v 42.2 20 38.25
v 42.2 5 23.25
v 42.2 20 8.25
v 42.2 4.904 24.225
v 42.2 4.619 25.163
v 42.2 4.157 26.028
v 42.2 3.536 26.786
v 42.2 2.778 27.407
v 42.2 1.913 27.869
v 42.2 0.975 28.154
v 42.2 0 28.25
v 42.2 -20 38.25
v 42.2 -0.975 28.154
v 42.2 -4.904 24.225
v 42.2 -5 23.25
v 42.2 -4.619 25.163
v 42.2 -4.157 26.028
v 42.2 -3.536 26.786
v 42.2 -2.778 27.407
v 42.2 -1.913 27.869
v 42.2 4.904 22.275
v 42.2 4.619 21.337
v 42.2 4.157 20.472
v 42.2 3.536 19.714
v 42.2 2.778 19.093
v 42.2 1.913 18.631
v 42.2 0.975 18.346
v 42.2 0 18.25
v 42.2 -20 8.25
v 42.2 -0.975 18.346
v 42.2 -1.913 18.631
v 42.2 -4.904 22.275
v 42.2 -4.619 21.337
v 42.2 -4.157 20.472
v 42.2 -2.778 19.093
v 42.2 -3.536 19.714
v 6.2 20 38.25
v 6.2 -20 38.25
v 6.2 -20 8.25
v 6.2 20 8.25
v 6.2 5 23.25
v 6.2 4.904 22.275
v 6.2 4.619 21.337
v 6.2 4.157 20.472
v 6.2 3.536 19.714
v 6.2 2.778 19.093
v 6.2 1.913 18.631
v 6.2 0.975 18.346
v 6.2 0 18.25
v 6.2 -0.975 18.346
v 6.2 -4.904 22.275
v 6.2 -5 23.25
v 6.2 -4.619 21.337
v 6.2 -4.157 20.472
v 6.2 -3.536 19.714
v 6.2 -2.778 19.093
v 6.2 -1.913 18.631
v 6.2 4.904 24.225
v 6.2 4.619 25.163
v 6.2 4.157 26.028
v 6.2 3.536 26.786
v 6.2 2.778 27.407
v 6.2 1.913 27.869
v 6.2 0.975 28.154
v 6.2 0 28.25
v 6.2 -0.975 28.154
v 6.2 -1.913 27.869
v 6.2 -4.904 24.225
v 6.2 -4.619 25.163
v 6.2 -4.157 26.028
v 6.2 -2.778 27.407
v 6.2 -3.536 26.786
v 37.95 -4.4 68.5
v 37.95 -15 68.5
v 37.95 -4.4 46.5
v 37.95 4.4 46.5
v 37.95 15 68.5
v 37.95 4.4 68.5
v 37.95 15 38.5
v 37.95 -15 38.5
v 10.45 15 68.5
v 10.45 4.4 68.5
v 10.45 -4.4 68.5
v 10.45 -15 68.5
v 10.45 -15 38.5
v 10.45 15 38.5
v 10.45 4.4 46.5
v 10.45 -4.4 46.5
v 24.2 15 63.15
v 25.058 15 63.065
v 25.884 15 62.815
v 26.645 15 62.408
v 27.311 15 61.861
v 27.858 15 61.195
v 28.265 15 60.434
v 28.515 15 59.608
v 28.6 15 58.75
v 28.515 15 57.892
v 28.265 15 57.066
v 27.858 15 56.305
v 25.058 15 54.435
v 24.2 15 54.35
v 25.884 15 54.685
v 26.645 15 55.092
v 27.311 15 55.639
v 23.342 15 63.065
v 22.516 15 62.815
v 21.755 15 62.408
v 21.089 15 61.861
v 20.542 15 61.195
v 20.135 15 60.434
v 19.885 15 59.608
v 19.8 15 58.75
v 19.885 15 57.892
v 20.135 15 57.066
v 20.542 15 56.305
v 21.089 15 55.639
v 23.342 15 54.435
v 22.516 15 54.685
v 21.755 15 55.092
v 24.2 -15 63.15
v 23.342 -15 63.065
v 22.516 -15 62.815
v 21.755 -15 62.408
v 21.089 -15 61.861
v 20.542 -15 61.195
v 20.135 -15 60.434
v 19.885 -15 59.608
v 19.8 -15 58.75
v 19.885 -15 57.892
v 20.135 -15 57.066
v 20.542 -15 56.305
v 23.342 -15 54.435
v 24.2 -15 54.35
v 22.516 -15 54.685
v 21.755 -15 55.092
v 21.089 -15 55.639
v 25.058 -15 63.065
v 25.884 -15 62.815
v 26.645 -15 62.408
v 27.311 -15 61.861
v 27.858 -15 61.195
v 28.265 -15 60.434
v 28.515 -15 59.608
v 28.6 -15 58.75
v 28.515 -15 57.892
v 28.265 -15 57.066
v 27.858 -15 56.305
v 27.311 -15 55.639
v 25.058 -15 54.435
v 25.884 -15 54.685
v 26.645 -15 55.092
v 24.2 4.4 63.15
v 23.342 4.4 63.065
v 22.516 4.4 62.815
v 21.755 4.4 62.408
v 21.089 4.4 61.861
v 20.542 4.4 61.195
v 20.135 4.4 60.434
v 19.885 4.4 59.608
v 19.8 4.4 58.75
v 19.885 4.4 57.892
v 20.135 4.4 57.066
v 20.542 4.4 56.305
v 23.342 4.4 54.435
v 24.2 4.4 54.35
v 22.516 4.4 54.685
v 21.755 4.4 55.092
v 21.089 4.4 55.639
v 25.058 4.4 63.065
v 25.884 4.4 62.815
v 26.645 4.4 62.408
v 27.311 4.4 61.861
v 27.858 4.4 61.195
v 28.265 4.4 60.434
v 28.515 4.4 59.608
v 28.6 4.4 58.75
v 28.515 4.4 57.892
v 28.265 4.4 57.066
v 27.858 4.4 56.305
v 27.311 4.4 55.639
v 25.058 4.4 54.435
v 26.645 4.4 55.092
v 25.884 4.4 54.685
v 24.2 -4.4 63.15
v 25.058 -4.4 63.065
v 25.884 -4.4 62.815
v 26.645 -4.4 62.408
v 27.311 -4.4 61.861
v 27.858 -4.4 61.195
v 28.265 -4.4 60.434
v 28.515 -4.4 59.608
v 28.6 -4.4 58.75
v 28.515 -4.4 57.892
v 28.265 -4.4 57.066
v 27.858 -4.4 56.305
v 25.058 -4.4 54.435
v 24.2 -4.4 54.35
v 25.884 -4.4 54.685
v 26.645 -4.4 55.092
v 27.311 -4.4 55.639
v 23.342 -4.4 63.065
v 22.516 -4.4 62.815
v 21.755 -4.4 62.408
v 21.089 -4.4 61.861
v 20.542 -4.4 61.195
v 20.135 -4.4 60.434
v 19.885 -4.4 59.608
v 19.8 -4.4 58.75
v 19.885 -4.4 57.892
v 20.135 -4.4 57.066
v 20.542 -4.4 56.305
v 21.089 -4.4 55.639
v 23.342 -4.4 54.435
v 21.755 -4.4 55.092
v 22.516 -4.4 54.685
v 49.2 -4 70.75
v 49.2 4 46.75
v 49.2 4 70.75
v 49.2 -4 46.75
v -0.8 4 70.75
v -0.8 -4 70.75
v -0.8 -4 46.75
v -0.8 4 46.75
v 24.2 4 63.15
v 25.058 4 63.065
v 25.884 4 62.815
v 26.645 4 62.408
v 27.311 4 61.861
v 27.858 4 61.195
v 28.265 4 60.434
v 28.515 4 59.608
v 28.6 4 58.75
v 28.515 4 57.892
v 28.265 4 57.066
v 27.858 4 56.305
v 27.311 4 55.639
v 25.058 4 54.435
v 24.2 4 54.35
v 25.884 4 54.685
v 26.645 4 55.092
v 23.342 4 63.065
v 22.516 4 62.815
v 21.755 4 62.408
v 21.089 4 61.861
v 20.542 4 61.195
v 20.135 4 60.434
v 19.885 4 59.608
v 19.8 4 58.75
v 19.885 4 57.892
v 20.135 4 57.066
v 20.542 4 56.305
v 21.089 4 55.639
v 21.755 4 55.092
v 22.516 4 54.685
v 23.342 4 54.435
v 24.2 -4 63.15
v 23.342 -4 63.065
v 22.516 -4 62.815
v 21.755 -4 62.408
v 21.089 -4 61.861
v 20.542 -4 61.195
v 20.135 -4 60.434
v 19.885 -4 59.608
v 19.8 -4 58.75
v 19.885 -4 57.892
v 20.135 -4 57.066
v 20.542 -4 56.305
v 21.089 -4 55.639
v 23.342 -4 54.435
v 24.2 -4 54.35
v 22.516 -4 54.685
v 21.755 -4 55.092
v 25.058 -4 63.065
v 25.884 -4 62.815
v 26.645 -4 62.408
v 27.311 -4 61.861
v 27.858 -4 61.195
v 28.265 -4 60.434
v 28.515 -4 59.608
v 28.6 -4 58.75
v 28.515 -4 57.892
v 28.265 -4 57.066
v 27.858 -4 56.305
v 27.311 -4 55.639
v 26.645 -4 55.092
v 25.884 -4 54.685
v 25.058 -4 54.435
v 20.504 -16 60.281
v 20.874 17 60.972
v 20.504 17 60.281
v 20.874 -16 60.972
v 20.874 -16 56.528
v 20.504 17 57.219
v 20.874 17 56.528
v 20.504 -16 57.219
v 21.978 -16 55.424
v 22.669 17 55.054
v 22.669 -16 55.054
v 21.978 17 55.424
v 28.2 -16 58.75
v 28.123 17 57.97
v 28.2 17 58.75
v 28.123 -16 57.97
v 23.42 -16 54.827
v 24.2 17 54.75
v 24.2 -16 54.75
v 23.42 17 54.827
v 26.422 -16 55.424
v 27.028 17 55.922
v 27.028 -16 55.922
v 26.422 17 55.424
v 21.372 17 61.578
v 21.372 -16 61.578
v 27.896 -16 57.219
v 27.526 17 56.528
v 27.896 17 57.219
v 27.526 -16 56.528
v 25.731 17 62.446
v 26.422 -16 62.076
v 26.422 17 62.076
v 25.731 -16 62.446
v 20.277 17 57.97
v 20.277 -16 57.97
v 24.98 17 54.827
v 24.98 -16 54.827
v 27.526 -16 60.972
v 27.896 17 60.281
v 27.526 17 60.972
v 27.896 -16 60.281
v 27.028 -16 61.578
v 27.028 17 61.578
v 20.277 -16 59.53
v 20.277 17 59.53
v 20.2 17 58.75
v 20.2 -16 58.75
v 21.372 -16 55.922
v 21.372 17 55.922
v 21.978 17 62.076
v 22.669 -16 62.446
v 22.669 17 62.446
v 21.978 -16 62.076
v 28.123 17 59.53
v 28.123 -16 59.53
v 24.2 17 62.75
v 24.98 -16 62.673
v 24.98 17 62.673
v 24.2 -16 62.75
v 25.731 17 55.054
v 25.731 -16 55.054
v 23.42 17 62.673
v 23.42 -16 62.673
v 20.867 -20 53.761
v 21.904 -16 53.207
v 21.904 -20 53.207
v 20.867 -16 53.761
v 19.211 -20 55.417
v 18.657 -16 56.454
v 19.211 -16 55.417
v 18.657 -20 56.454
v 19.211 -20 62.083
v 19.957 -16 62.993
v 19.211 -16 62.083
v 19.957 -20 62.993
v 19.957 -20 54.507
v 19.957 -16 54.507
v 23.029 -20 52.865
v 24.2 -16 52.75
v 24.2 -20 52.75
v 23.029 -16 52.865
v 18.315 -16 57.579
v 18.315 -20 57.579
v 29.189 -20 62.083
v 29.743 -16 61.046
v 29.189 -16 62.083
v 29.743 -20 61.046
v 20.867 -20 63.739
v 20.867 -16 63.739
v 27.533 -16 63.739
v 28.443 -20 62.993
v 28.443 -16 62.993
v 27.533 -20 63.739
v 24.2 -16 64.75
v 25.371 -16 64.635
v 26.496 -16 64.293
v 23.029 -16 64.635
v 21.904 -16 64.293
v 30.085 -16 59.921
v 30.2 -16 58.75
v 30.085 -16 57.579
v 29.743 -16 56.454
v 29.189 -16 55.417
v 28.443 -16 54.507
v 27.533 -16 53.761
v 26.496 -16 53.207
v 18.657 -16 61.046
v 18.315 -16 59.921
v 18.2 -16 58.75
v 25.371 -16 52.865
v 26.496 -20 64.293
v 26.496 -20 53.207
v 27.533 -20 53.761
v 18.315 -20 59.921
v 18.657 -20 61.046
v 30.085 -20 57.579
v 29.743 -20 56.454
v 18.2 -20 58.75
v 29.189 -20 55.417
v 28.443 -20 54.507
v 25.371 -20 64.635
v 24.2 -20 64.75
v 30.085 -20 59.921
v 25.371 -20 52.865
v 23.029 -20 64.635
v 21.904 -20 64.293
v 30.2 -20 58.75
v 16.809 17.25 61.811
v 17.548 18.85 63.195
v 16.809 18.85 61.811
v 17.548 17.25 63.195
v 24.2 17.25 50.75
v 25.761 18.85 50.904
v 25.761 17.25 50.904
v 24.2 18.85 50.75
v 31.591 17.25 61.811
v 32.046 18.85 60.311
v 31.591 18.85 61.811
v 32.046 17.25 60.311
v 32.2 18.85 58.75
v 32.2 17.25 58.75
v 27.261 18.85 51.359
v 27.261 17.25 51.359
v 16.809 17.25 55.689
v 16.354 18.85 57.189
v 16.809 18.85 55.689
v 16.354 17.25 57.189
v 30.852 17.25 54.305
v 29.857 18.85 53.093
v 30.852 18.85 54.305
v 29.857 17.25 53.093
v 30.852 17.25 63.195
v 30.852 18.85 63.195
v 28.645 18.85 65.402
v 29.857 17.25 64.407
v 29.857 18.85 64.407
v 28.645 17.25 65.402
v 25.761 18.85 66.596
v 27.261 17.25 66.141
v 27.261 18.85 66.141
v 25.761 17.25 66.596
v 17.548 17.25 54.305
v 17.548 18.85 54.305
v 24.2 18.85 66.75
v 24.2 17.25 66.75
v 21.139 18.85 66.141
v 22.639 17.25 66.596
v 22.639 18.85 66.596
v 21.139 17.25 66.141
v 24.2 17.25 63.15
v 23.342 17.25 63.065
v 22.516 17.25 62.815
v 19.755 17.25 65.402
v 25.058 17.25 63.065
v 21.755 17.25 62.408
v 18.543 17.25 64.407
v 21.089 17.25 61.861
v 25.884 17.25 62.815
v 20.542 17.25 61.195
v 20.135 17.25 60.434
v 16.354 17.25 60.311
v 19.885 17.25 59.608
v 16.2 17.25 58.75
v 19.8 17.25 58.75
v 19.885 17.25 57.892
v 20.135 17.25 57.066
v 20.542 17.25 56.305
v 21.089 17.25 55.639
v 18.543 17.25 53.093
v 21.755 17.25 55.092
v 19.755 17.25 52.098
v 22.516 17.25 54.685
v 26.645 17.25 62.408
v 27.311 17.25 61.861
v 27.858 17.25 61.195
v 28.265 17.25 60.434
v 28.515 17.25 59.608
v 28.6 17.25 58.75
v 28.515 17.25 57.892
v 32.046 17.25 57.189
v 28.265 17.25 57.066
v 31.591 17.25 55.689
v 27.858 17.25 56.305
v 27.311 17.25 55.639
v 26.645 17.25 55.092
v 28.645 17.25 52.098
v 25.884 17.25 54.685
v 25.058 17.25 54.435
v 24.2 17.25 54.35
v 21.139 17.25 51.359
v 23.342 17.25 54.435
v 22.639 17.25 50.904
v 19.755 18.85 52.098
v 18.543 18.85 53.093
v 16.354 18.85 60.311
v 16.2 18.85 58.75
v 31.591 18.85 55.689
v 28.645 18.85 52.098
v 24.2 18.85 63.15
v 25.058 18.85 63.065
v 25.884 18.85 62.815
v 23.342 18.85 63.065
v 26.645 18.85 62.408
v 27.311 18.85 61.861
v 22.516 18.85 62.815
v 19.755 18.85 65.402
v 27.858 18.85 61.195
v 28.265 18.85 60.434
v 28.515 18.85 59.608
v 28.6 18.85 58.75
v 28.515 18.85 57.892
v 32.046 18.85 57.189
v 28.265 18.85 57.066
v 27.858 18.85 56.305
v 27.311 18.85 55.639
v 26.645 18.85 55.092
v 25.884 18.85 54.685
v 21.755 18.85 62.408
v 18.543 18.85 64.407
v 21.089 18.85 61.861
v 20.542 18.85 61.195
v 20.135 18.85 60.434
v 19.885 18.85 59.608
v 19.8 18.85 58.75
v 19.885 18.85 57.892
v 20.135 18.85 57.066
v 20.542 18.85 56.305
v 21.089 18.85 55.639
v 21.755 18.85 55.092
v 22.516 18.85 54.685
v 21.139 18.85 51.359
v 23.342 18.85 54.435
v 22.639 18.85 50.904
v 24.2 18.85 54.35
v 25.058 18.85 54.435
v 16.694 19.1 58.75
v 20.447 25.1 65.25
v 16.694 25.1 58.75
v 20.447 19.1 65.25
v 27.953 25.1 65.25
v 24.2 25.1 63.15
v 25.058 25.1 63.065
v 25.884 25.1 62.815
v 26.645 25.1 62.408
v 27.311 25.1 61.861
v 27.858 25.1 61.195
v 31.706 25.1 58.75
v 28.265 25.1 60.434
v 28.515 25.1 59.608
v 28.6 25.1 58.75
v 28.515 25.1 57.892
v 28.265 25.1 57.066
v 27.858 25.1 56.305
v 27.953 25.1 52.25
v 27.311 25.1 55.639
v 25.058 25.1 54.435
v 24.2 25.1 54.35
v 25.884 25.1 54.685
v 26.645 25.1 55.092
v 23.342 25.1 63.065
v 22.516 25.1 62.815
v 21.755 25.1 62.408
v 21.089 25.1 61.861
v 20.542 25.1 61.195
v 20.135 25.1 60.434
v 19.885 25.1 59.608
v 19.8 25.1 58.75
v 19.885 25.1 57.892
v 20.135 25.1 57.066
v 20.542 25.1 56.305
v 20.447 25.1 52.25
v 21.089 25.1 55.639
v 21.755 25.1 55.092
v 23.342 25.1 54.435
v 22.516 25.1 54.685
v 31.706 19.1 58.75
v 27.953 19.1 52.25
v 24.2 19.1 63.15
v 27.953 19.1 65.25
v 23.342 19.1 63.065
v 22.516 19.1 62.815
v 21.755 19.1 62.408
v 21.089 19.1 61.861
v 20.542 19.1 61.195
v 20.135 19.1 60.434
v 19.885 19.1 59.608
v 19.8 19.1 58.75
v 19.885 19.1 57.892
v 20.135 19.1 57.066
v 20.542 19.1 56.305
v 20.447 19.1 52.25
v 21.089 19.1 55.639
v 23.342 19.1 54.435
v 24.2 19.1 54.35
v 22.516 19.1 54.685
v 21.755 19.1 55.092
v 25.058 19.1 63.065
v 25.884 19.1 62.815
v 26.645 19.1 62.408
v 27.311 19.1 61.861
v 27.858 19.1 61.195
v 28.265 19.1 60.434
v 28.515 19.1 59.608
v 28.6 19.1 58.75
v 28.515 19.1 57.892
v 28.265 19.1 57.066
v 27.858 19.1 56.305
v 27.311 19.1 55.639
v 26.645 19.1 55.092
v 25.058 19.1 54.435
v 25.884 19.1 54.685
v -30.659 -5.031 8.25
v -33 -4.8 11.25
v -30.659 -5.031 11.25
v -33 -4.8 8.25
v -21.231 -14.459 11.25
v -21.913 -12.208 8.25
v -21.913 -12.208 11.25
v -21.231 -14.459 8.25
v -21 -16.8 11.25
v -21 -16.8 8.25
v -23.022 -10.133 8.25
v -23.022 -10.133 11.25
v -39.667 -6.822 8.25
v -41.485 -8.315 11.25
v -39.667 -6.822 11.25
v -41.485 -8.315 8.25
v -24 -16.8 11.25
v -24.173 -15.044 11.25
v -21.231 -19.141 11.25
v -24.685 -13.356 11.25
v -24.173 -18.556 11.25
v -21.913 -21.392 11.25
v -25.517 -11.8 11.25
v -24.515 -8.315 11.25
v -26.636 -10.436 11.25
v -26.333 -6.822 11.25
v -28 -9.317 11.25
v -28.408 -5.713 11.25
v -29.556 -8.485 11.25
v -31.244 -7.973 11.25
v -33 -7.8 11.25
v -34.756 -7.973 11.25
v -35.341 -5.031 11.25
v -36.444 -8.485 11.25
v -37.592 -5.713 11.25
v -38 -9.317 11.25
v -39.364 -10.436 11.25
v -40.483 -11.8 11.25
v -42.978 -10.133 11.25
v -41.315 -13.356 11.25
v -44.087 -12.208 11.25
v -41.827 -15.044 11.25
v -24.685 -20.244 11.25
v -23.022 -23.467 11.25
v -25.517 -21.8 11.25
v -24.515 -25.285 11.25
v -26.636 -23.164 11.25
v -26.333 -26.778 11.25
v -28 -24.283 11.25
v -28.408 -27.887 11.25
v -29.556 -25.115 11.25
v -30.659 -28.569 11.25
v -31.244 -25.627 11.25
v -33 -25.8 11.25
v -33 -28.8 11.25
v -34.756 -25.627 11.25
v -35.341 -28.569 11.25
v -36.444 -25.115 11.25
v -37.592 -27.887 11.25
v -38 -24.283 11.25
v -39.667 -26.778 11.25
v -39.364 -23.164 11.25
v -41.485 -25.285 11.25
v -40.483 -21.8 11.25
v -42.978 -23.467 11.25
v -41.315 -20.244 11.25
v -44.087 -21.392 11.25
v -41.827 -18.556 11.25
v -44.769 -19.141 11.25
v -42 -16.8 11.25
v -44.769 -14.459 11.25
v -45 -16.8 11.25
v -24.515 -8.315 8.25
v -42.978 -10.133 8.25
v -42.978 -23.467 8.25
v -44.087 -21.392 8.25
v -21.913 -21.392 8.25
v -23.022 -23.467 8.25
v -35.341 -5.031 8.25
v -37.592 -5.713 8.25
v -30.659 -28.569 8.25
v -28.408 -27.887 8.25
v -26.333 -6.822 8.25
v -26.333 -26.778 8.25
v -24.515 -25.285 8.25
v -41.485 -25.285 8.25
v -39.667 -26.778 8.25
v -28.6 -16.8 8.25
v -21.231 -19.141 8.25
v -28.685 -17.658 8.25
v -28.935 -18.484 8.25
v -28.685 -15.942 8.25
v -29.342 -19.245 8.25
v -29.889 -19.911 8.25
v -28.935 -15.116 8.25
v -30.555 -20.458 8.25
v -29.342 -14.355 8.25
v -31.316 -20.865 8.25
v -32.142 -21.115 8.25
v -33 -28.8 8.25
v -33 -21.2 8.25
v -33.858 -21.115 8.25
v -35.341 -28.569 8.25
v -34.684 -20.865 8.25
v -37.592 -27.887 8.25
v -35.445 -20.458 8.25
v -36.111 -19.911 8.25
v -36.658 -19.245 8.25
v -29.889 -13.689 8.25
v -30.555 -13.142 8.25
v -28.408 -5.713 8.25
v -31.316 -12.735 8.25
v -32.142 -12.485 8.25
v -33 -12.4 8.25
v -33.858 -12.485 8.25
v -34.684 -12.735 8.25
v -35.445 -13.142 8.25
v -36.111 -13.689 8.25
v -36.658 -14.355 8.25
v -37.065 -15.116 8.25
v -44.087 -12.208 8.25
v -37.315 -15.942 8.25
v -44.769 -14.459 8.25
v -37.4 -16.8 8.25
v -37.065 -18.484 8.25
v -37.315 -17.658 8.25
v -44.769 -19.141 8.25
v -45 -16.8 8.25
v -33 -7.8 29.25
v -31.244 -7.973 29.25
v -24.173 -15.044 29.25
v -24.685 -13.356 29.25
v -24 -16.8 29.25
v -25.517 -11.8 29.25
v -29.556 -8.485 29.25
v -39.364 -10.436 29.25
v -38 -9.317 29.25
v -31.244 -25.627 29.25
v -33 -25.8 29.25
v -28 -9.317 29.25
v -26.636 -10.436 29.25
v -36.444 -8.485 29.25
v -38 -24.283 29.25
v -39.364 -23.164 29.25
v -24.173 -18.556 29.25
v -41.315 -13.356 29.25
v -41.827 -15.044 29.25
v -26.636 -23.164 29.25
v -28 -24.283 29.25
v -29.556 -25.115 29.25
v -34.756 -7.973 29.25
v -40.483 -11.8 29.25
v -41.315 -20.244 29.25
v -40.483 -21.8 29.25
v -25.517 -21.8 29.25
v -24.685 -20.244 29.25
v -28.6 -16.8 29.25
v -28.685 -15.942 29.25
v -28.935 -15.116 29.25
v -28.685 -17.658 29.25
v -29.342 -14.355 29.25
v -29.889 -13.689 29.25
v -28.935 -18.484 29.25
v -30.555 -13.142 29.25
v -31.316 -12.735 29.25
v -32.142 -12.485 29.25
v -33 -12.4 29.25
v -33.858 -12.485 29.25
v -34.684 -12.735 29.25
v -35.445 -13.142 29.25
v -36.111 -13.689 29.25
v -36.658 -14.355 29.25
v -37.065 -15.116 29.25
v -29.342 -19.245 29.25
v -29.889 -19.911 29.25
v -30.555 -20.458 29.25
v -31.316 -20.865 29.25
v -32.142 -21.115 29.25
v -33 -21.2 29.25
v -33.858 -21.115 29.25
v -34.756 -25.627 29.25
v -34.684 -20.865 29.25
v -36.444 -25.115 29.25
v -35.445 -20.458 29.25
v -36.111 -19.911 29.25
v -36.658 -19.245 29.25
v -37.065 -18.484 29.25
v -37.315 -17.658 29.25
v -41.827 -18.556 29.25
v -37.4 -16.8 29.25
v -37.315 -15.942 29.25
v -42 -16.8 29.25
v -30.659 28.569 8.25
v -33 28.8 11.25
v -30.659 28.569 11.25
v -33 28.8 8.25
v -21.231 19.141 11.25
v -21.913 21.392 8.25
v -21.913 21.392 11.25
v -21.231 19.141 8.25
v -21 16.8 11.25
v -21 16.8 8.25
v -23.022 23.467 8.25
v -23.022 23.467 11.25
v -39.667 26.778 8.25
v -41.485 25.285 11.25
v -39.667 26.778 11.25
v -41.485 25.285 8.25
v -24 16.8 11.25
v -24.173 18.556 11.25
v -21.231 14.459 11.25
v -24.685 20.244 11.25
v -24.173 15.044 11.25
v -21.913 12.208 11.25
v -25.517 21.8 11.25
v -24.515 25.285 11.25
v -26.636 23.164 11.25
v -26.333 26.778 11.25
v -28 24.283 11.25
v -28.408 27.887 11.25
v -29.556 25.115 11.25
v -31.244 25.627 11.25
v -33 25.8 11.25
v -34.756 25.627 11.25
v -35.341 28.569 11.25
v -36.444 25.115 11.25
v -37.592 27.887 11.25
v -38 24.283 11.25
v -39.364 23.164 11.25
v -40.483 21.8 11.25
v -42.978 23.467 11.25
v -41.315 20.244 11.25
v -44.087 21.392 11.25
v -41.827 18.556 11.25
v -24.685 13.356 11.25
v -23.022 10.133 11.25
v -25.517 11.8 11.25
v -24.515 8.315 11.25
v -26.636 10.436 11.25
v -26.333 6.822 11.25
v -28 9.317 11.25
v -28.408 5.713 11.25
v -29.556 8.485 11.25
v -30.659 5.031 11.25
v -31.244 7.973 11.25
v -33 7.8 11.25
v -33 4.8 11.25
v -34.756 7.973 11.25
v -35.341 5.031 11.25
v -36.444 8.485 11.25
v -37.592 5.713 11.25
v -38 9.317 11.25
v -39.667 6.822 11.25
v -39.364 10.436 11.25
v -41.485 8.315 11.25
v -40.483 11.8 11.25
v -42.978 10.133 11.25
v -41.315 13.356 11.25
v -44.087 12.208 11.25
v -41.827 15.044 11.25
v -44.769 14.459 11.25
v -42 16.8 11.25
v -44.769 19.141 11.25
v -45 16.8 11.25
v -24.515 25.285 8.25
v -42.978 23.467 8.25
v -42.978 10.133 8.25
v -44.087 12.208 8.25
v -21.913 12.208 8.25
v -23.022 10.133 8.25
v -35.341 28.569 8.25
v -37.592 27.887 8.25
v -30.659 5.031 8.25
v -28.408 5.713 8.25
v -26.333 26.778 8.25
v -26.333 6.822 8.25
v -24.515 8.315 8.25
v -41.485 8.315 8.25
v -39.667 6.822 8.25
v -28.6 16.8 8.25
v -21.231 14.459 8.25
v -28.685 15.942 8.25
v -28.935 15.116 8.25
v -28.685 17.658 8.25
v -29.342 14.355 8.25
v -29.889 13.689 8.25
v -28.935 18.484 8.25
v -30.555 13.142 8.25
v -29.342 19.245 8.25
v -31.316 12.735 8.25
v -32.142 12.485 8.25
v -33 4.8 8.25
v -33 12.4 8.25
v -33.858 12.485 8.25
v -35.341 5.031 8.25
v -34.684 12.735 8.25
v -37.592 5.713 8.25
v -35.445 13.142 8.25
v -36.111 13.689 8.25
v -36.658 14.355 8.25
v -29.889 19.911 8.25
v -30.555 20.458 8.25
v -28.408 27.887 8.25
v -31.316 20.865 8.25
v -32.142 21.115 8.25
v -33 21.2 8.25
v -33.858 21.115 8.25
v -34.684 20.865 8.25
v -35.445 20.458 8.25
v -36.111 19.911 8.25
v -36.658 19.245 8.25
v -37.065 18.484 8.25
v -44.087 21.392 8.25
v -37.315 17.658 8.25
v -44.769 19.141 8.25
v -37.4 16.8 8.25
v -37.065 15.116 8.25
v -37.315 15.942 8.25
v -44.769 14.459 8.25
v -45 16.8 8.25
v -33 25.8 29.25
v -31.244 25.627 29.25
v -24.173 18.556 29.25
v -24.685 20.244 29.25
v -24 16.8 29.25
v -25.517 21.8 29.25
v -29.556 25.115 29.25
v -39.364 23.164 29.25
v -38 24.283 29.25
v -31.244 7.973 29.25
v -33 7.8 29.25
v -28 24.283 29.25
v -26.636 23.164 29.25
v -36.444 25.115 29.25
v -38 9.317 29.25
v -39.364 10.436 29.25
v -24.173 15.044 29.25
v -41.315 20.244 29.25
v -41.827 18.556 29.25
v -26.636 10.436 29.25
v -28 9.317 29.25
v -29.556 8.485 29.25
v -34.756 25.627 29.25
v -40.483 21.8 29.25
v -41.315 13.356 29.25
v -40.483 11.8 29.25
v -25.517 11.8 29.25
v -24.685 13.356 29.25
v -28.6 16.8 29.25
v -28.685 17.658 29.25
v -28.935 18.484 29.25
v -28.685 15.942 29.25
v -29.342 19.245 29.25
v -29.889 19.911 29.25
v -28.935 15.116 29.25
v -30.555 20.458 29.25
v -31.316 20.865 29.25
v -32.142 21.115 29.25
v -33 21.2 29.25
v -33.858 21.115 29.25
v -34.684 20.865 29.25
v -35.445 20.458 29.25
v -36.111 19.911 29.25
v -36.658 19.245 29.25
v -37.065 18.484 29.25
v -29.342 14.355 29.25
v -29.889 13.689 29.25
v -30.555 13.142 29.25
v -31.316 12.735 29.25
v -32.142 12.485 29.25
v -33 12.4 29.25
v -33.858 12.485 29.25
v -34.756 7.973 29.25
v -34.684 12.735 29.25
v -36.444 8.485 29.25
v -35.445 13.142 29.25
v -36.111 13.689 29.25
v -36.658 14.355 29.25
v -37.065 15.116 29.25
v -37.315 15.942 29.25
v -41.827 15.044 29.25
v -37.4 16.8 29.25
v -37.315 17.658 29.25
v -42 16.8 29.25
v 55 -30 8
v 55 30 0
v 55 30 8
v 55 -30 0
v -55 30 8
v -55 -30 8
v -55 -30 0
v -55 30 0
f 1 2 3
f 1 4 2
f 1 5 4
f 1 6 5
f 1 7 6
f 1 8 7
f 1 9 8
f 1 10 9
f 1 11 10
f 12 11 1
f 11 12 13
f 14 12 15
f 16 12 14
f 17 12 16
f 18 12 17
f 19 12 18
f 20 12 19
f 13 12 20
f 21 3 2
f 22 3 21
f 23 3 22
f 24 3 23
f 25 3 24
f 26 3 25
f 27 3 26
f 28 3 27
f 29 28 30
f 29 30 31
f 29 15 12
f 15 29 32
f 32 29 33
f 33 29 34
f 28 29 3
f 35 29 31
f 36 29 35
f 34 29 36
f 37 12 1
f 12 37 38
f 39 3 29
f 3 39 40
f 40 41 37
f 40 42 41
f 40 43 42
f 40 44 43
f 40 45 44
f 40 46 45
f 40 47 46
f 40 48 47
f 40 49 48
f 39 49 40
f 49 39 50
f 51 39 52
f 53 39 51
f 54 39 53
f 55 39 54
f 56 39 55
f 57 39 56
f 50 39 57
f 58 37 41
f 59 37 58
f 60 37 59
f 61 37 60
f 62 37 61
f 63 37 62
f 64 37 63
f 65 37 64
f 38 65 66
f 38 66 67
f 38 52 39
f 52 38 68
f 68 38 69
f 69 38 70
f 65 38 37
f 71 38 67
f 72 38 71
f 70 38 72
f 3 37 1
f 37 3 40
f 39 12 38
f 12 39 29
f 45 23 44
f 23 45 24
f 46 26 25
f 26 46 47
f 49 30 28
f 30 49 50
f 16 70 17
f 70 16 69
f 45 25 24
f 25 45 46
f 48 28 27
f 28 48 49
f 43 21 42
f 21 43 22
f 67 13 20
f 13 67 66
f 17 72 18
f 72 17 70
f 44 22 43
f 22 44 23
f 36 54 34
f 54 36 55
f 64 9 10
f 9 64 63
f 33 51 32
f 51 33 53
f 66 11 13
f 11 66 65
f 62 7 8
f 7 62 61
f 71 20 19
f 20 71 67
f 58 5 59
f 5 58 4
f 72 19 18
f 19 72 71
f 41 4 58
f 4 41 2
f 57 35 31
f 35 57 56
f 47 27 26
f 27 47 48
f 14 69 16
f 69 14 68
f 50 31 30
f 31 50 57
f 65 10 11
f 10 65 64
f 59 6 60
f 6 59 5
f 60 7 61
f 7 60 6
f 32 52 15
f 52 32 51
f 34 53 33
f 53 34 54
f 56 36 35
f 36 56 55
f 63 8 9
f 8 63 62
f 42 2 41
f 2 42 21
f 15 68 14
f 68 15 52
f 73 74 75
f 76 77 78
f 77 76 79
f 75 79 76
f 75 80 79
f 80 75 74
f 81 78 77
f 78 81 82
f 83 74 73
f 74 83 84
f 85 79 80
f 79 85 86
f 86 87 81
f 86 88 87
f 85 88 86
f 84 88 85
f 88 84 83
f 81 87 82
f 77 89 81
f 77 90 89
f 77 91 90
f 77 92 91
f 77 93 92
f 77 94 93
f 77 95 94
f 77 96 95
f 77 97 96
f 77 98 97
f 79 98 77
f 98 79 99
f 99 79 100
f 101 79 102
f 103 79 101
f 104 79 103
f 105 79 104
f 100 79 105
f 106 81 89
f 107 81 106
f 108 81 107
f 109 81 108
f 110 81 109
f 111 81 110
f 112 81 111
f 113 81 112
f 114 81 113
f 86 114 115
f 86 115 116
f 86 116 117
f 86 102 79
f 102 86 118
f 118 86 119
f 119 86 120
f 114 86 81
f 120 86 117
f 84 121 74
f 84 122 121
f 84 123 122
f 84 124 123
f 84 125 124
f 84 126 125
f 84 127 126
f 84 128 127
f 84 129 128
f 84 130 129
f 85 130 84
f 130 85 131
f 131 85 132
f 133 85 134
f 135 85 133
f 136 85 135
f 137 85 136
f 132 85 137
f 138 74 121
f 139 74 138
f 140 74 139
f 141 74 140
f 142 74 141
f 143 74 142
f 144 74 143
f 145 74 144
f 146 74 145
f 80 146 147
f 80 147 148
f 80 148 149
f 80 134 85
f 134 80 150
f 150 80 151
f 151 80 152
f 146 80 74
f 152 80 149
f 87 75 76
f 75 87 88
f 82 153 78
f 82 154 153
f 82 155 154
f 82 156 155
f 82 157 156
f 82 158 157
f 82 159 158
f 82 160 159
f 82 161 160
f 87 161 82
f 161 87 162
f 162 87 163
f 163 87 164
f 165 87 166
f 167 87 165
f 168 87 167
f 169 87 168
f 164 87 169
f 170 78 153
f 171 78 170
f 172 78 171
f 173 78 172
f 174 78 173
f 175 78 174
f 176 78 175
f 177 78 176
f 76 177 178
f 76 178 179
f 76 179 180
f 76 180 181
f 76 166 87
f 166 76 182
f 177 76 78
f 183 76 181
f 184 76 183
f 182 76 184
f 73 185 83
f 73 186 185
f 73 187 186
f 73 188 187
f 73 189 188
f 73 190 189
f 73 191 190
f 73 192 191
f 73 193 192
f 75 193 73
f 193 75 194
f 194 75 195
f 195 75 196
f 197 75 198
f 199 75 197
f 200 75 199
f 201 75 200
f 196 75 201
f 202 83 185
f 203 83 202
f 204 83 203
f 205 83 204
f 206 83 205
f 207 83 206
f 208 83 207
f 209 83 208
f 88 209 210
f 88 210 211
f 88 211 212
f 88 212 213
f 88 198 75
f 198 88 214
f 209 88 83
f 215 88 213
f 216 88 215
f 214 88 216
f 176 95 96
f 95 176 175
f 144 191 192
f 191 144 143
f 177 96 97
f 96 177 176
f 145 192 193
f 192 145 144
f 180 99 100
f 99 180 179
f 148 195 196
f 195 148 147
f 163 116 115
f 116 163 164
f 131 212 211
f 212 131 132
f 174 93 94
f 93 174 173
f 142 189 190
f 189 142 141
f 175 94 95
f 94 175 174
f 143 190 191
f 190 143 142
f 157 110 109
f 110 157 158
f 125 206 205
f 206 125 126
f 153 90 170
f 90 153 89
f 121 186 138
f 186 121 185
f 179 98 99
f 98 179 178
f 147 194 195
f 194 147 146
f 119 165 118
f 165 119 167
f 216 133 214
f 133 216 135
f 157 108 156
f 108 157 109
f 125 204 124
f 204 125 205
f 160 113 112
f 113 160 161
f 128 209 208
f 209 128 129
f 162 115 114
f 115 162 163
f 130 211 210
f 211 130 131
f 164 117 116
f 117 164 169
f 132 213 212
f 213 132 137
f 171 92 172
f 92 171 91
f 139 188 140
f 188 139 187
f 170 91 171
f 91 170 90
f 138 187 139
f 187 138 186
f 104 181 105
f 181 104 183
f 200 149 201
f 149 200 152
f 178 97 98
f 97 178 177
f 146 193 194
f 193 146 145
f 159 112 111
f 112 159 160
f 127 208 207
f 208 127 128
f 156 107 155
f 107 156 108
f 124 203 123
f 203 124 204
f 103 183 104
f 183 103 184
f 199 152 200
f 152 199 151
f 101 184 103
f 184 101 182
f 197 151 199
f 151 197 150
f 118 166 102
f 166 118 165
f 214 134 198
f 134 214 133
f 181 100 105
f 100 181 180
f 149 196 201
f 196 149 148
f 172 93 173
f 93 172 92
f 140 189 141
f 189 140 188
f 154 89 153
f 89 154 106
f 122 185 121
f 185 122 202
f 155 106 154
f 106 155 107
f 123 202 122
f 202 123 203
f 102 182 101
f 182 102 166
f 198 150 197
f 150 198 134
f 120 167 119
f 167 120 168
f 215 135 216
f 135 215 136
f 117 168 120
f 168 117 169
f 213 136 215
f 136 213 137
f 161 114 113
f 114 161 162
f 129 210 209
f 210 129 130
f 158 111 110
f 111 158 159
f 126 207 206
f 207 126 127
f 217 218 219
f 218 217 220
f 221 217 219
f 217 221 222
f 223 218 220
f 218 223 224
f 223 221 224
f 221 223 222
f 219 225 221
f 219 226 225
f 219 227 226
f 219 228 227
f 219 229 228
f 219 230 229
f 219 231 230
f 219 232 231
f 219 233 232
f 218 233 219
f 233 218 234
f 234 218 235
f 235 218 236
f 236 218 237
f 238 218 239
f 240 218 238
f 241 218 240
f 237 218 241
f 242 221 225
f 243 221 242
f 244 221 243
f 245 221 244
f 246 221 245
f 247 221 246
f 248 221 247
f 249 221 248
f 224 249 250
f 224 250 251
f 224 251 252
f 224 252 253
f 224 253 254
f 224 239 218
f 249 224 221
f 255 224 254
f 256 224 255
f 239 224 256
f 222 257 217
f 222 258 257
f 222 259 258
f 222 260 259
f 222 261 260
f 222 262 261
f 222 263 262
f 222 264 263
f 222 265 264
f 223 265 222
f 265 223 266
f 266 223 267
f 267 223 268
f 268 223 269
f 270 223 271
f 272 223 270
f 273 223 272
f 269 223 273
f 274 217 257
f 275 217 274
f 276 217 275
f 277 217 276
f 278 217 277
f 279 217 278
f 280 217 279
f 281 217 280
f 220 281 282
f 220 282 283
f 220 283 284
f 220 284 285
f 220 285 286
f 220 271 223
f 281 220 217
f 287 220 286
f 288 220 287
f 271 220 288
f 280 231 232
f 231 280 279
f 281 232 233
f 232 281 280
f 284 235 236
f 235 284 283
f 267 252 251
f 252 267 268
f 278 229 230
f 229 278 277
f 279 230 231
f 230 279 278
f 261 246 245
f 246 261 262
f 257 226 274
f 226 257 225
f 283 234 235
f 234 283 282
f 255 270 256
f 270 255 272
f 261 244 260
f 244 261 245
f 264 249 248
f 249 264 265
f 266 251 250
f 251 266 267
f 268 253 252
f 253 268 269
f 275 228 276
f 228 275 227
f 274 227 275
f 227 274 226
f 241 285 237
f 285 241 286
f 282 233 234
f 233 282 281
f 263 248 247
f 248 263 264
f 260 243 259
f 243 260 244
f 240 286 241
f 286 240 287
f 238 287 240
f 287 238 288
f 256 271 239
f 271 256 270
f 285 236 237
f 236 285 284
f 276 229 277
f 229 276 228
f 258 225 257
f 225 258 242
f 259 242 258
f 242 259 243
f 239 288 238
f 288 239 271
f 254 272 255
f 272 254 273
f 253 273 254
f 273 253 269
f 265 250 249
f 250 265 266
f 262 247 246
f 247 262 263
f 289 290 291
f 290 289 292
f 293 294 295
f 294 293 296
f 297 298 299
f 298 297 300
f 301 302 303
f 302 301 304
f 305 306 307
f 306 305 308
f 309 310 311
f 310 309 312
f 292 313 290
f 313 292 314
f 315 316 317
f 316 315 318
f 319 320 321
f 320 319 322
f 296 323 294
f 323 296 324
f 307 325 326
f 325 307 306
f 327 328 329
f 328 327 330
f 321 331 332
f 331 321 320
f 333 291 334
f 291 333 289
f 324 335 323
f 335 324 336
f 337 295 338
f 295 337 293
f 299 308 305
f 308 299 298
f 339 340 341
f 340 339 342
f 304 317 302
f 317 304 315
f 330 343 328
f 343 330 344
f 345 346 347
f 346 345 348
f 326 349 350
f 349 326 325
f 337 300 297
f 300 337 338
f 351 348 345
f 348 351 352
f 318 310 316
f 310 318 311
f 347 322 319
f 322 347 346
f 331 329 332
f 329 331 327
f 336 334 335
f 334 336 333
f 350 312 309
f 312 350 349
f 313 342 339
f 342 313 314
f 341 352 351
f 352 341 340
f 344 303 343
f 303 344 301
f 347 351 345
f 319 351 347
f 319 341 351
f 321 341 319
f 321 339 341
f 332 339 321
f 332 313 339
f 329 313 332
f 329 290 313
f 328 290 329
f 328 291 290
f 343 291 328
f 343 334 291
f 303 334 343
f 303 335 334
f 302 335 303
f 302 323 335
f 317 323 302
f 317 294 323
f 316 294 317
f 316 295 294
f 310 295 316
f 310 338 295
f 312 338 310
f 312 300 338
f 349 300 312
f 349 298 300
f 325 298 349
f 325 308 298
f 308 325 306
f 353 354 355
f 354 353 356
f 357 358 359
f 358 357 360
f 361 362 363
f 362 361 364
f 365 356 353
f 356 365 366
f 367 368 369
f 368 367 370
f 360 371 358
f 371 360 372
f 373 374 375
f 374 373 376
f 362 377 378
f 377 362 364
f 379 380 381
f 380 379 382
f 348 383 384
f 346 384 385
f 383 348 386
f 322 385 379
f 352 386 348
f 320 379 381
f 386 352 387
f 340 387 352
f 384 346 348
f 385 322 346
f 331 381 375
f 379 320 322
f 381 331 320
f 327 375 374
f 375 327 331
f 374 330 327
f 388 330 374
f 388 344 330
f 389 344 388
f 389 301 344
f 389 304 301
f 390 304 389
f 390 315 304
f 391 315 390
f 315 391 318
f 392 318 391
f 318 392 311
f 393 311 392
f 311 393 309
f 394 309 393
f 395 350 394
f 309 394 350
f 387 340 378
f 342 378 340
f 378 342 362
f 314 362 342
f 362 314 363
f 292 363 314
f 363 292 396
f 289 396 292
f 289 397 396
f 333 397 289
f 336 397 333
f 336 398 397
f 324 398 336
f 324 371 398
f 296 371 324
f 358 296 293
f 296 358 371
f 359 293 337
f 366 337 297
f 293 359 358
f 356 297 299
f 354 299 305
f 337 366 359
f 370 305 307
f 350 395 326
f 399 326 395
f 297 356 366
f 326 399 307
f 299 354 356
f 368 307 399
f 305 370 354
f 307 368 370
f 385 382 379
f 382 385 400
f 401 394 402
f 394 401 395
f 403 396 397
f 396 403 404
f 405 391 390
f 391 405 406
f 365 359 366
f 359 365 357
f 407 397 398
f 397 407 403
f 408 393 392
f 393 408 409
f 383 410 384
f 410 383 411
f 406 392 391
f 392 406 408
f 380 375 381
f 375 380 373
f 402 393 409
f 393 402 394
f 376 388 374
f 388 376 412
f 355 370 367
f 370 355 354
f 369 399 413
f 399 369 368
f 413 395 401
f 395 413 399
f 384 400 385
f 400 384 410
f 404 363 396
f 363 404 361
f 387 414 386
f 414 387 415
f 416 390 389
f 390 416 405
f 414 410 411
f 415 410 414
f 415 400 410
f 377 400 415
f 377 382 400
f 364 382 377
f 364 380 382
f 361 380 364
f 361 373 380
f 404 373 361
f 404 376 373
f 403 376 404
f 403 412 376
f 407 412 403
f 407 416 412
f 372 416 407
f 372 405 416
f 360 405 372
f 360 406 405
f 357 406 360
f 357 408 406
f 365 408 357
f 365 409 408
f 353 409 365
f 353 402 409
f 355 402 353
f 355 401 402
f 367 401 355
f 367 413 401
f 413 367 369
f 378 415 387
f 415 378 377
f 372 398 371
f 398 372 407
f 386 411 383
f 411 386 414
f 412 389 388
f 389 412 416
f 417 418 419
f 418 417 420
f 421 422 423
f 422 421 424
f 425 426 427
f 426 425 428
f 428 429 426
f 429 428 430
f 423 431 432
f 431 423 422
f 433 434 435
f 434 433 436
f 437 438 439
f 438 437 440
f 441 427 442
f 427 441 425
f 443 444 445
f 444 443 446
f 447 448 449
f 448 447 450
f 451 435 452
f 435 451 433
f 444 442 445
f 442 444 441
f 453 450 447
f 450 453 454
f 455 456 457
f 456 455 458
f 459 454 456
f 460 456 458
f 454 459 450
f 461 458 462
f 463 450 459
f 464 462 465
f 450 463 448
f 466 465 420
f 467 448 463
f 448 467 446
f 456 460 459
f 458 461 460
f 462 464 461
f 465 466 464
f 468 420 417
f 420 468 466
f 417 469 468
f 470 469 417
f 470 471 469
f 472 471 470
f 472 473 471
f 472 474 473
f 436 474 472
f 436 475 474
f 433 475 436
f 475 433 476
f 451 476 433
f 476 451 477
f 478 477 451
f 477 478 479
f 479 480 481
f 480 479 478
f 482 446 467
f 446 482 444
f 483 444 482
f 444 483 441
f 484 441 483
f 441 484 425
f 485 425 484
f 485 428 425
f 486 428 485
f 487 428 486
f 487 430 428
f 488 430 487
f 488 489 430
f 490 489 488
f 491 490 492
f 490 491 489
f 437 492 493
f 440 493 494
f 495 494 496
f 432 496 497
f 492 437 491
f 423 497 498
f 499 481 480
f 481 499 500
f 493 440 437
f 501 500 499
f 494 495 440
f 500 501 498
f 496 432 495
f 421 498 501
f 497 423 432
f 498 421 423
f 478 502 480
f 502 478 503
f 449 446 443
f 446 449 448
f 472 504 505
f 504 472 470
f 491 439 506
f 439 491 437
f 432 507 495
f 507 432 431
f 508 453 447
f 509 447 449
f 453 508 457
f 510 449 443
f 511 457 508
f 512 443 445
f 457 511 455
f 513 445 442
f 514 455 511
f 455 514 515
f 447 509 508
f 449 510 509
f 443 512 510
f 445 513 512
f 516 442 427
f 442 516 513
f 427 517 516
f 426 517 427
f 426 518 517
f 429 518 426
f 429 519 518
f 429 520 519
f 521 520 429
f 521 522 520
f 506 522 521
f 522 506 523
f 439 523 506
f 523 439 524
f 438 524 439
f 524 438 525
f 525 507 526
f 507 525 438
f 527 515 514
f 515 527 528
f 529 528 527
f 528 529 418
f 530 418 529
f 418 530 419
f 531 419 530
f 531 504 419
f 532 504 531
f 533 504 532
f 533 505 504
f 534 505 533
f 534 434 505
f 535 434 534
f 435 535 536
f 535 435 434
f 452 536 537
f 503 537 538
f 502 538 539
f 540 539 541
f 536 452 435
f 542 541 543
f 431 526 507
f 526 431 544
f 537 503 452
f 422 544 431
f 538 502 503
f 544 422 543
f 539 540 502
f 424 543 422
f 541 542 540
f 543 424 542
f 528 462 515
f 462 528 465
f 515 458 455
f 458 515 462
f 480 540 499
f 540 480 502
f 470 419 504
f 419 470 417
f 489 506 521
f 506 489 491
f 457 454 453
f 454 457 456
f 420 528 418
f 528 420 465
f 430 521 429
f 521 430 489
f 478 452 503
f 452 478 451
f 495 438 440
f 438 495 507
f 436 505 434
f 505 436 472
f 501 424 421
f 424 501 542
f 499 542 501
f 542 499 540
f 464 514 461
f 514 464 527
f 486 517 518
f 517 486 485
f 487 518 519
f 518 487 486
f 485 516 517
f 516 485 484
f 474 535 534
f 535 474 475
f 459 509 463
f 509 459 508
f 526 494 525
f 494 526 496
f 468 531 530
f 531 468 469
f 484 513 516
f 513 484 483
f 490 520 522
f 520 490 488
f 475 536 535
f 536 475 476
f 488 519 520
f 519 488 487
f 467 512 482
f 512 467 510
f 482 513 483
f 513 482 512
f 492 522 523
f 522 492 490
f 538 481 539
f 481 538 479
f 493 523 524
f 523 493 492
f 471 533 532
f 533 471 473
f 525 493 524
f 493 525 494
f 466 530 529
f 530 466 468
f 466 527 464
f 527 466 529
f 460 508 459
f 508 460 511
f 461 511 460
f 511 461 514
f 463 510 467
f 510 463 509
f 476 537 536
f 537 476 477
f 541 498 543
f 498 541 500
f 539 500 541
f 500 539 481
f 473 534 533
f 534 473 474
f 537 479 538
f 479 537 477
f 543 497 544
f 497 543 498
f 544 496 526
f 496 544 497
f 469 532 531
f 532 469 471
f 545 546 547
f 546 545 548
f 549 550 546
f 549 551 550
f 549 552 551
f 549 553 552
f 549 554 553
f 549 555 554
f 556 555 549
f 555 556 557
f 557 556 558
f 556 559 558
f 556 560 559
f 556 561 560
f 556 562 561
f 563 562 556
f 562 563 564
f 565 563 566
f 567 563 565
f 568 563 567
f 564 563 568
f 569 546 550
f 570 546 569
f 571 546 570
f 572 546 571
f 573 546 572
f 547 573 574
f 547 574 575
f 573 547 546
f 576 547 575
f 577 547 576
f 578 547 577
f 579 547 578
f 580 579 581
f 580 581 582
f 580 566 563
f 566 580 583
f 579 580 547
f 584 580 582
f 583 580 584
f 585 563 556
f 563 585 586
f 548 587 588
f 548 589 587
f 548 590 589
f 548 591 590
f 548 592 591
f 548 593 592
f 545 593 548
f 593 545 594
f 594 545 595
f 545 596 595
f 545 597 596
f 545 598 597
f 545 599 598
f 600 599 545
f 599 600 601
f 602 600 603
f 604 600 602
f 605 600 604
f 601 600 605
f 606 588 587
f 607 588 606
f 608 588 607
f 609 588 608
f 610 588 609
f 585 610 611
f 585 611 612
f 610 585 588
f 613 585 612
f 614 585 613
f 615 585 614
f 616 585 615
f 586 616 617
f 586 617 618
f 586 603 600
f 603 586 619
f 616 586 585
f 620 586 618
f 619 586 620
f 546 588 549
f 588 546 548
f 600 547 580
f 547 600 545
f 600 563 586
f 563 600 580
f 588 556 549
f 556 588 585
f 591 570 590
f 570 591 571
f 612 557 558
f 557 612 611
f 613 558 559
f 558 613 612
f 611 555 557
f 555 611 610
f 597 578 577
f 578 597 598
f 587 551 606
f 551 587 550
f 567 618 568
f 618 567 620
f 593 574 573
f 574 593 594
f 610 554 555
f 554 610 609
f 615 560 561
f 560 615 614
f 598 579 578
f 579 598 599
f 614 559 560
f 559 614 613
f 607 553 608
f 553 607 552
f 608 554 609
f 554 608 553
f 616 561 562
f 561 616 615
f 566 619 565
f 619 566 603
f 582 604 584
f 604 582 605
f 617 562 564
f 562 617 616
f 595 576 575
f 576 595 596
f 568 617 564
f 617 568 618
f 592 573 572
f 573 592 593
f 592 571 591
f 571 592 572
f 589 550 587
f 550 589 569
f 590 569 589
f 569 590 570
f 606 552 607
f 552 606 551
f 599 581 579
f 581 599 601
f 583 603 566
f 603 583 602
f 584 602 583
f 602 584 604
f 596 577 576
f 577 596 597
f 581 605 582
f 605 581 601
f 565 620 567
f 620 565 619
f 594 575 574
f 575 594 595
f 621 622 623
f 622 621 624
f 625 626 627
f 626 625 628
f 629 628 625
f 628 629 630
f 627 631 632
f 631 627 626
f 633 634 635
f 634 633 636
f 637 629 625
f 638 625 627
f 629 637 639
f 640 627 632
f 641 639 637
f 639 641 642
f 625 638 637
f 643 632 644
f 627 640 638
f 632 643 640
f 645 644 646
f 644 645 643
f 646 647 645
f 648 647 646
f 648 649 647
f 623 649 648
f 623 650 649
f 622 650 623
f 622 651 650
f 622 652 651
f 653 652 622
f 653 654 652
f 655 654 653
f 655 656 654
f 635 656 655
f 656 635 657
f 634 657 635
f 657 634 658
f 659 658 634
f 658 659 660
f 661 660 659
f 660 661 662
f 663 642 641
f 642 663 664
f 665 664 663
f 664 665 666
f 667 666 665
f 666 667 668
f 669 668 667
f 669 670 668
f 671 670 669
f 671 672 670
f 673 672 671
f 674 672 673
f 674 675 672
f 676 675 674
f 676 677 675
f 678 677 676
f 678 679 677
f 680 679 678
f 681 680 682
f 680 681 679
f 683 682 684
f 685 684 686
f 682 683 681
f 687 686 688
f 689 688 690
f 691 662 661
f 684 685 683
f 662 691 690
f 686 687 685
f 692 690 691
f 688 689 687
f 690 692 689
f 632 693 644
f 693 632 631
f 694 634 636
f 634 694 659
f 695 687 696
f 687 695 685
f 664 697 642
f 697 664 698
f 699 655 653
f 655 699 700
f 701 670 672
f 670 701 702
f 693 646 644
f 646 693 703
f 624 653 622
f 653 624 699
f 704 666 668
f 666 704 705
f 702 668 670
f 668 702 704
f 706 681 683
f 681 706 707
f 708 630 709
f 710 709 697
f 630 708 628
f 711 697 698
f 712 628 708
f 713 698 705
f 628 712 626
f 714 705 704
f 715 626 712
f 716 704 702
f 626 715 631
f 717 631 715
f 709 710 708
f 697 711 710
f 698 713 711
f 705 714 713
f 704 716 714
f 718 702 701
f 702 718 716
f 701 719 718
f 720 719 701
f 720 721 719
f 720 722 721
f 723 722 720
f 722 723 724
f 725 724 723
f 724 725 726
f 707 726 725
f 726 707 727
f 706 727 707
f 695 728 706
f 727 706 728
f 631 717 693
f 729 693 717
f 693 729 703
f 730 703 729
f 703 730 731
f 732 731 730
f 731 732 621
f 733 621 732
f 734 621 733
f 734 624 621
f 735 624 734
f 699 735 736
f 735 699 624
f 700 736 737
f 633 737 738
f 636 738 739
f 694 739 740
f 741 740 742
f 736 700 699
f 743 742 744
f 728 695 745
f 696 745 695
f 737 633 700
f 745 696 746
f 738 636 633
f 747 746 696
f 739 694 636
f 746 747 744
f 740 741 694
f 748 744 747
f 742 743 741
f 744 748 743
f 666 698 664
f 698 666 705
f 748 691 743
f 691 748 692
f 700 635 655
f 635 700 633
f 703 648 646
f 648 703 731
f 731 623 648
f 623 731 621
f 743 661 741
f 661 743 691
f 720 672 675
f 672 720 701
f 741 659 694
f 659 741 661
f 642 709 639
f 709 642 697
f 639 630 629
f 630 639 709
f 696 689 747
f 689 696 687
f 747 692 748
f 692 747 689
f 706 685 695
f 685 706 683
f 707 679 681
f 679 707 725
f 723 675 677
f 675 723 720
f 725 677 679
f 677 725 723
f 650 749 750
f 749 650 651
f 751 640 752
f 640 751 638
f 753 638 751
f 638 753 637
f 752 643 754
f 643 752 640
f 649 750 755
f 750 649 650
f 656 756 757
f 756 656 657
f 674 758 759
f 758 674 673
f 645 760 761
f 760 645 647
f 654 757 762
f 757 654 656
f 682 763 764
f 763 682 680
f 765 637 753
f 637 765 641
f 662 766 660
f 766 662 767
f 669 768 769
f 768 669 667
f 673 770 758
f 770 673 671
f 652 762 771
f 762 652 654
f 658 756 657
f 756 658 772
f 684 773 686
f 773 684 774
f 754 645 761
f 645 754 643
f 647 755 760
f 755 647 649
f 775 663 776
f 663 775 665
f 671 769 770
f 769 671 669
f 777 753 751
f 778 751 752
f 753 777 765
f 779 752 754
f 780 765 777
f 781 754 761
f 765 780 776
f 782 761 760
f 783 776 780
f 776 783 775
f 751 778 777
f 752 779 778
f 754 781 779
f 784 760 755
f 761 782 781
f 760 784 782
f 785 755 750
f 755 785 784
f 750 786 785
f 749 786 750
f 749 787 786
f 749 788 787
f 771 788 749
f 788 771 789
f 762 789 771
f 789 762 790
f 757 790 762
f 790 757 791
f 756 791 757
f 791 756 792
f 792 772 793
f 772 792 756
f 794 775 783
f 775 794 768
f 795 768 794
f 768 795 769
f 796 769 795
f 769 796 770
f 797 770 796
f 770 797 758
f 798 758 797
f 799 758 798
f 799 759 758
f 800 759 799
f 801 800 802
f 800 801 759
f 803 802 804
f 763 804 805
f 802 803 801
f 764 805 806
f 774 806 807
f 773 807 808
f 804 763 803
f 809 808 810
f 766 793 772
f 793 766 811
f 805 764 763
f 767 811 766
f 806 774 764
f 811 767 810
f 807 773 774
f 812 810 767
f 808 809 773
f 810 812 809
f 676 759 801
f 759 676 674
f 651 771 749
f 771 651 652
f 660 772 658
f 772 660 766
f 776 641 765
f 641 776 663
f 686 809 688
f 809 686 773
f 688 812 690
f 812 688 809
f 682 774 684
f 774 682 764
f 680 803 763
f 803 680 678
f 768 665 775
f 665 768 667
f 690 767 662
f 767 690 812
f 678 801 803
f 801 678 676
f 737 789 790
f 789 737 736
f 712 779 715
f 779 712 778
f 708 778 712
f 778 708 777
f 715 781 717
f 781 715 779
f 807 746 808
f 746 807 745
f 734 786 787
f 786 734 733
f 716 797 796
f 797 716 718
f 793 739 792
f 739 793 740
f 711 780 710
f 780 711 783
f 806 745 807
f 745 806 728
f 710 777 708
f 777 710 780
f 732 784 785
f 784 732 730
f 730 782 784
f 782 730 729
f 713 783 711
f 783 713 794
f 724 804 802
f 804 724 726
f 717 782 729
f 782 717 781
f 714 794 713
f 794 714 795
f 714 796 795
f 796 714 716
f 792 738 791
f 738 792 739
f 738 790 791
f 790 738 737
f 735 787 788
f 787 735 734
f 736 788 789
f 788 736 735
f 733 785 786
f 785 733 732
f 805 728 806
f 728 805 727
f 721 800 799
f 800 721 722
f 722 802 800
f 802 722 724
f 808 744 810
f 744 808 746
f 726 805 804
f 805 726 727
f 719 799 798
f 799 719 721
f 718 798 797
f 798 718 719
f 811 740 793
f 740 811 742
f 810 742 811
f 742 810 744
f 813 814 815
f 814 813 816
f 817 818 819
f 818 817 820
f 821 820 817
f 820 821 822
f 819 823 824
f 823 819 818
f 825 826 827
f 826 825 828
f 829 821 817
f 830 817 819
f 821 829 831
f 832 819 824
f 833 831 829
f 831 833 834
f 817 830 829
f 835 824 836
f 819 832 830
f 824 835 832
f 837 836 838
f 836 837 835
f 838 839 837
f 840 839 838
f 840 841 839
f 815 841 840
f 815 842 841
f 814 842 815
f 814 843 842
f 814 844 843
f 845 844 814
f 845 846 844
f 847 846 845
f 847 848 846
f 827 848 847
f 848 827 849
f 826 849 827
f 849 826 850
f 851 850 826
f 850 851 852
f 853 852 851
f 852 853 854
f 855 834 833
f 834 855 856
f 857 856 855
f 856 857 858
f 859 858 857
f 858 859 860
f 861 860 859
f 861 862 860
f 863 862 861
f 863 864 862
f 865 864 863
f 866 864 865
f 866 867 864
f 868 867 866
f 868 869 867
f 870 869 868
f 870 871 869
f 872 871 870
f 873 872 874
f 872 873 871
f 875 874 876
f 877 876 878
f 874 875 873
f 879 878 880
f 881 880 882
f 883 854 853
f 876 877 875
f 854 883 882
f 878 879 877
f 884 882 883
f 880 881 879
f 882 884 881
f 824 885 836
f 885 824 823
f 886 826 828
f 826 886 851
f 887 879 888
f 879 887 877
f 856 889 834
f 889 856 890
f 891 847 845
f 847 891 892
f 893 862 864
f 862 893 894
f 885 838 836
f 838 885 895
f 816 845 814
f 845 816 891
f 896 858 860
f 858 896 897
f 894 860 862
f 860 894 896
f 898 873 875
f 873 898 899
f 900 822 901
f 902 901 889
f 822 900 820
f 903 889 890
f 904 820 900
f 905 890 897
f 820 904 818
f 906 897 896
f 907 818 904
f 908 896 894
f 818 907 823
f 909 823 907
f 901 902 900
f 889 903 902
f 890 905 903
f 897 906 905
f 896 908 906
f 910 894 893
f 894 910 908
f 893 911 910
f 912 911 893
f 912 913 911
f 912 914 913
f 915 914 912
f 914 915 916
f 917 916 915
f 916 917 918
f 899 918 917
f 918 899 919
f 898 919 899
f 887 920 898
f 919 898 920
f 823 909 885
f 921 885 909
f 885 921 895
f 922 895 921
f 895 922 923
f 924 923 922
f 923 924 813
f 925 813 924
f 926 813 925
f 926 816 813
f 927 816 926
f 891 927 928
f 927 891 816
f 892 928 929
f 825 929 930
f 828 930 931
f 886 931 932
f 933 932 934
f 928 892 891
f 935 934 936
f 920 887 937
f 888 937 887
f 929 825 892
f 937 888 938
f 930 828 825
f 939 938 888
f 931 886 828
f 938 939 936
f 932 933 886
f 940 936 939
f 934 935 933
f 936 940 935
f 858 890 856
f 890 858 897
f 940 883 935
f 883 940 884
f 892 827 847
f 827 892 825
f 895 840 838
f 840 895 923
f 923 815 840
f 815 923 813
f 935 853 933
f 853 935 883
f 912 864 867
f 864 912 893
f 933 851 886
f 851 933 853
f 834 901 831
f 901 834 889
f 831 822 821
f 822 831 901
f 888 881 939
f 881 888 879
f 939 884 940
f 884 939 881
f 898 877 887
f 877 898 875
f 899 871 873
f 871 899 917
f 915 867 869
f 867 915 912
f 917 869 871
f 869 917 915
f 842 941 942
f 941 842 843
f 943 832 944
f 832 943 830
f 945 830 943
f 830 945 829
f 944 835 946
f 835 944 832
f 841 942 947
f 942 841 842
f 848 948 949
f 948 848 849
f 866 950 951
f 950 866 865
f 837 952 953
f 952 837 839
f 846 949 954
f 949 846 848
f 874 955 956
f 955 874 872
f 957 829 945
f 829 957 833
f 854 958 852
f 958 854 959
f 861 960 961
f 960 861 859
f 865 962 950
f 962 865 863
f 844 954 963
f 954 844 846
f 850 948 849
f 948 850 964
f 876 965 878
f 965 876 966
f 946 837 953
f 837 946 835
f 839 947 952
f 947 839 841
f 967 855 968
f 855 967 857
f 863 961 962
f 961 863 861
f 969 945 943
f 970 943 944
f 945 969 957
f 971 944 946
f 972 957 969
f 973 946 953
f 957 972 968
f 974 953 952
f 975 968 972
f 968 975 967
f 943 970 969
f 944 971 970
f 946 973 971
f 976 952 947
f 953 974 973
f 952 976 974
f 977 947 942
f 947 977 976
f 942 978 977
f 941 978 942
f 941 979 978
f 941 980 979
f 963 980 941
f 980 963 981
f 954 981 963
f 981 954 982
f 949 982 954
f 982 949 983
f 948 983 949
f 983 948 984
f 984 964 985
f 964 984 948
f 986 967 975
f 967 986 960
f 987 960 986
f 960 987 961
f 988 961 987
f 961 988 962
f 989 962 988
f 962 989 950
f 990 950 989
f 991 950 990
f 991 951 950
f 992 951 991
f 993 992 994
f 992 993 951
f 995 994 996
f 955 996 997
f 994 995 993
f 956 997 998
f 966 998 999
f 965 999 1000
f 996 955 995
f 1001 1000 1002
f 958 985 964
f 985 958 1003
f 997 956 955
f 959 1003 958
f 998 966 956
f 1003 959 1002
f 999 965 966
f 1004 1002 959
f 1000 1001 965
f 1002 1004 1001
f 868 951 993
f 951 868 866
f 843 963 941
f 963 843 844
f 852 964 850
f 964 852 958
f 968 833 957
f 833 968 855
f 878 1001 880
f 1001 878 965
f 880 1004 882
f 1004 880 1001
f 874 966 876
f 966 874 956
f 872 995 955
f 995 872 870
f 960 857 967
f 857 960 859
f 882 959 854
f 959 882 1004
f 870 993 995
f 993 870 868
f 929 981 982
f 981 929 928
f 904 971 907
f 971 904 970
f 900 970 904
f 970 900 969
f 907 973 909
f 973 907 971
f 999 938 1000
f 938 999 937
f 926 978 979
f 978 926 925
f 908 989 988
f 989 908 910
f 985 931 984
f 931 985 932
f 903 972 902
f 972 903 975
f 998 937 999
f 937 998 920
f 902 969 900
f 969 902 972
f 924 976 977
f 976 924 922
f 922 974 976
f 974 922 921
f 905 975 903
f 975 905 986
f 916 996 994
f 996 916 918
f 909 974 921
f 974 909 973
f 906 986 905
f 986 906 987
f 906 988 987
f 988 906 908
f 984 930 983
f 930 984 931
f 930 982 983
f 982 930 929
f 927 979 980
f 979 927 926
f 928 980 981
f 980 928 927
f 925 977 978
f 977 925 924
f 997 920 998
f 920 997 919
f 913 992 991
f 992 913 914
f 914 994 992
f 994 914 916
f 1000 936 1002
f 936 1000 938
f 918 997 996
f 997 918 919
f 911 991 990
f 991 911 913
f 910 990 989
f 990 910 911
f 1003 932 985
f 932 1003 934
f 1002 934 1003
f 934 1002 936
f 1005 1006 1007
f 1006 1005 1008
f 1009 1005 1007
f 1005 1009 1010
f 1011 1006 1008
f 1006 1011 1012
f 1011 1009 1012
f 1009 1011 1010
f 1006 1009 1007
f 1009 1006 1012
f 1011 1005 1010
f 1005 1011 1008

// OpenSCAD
$fn = 32;

// ------------------------------------------------------------------------
// Indexing jig: plate 110 x 60 mm, pin d8
// Every part is its own module, assembly() places every instance.
// ------------------------------------------------------------------------

// --- part 1 ---
module jig_plate() {
  difference() {
    translate([-55, -30, 0]) cube([110, 60, 8]);
  }
}

// --- part 2 ---
module locator_block() {
  difference() {
    translate([-18, -20, 0]) cube([36, 40, 30]);
    translate([0, 0, 15]) rotate([0, 90, 0]) cylinder(h = 38, d = 10, center = true);
  }
}

// --- part 3 ---
module index_fork() {
  difference() {
    translate([-13.75, -15, 0]) cube([27.5, 30, 30]);
    translate([-14.75, -4.4, 8]) cube([29.5, 8.8, 23]);
    translate([0, 0, 20.25]) rotate([90, 0, 0]) cylinder(h = 32, d = 8.8, center = true);
  }
}

// --- part 4 ---
module index_arm() {
  difference() {
    translate([-25, -4, 0]) cube([50, 8, 24]);
    translate([0, 0, 12]) rotate([90, 0, 0]) cylinder(h = 10, d = 8.8, center = true);
  }
}

// --- part 5 ---
module index_pin() {
  rotate([0, 90, 0]) cylinder(h = 34, d = 8, center = true);
  translate([-20, 0, 0]) rotate([0, 90, 0]) cylinder(h = 4, d = 12);
}

// --- part 6 ---
module pin_washer() {
  difference() {
      translate([0, 0, 0]) cylinder(h = 1.6, d = 16);
      translate([0, 0, -1]) cylinder(h = 3.6, d = 8.8);
    }
}

// --- part 7 ---
module lock_nut() {
  difference() {
    linear_extrude(height = 6) polygon(points = [[7.506, 0], [3.753, 6.5], [-3.753, 6.5], [-7.506, 0], [-3.753, -6.5], [3.753, -6.5]]);
    translate([0, 0, -1]) cylinder(h = 8, d = 8.8);
  }
}

// --- part 8 ---
module guide_bush_a() {
  difference() {
    union() {
      cylinder(h = 3, d = 24);
      translate([0, 0, 3]) cylinder(h = 18, d = 18);
    }
    translate([0, 0, -1]) cylinder(h = 23, d = 8.8);
  }
}

// --- part 9 ---
module guide_bush_b() {
  difference() {
    union() {
      cylinder(h = 3, d = 24);
      translate([0, 0, 3]) cylinder(h = 18, d = 18);
    }
    translate([0, 0, -1]) cylinder(h = 23, d = 8.8);
  }
}

// --- assembly ---
module assembly() {
  color([0.80, 0.24, 0.20]) translate([0, 0, 0]) rotate([0, 0, 0]) jig_plate();
  color([0.20, 0.45, 0.75]) translate([24.2, 0, 8.25]) rotate([0, 0, 0]) locator_block();
  color([0.25, 0.62, 0.32]) translate([24.2, 0, 38.5]) rotate([0, 0, 0]) index_fork();
  color([0.92, 0.70, 0.18]) translate([24.2, 0, 46.75]) rotate([0, 0, 0]) index_arm();
  color([0.58, 0.35, 0.70]) translate([24.2, 0, 58.75]) rotate([0, 0, 90]) index_pin();
  color([0.16, 0.66, 0.66]) translate([24.2, 18.85, 58.75]) rotate([90, 0, 0]) pin_washer();
  color([0.85, 0.48, 0.18]) translate([24.2, 25.1, 58.75]) rotate([90, 0, 0]) lock_nut();
  color([0.55, 0.60, 0.65]) translate([-33, -16.8, 8.25]) rotate([0, 0, 0]) guide_bush_a();
  color([0.75, 0.30, 0.55]) translate([-33, 16.8, 8.25]) rotate([0, 0, 0]) guide_bush_b();
}

assembly();
